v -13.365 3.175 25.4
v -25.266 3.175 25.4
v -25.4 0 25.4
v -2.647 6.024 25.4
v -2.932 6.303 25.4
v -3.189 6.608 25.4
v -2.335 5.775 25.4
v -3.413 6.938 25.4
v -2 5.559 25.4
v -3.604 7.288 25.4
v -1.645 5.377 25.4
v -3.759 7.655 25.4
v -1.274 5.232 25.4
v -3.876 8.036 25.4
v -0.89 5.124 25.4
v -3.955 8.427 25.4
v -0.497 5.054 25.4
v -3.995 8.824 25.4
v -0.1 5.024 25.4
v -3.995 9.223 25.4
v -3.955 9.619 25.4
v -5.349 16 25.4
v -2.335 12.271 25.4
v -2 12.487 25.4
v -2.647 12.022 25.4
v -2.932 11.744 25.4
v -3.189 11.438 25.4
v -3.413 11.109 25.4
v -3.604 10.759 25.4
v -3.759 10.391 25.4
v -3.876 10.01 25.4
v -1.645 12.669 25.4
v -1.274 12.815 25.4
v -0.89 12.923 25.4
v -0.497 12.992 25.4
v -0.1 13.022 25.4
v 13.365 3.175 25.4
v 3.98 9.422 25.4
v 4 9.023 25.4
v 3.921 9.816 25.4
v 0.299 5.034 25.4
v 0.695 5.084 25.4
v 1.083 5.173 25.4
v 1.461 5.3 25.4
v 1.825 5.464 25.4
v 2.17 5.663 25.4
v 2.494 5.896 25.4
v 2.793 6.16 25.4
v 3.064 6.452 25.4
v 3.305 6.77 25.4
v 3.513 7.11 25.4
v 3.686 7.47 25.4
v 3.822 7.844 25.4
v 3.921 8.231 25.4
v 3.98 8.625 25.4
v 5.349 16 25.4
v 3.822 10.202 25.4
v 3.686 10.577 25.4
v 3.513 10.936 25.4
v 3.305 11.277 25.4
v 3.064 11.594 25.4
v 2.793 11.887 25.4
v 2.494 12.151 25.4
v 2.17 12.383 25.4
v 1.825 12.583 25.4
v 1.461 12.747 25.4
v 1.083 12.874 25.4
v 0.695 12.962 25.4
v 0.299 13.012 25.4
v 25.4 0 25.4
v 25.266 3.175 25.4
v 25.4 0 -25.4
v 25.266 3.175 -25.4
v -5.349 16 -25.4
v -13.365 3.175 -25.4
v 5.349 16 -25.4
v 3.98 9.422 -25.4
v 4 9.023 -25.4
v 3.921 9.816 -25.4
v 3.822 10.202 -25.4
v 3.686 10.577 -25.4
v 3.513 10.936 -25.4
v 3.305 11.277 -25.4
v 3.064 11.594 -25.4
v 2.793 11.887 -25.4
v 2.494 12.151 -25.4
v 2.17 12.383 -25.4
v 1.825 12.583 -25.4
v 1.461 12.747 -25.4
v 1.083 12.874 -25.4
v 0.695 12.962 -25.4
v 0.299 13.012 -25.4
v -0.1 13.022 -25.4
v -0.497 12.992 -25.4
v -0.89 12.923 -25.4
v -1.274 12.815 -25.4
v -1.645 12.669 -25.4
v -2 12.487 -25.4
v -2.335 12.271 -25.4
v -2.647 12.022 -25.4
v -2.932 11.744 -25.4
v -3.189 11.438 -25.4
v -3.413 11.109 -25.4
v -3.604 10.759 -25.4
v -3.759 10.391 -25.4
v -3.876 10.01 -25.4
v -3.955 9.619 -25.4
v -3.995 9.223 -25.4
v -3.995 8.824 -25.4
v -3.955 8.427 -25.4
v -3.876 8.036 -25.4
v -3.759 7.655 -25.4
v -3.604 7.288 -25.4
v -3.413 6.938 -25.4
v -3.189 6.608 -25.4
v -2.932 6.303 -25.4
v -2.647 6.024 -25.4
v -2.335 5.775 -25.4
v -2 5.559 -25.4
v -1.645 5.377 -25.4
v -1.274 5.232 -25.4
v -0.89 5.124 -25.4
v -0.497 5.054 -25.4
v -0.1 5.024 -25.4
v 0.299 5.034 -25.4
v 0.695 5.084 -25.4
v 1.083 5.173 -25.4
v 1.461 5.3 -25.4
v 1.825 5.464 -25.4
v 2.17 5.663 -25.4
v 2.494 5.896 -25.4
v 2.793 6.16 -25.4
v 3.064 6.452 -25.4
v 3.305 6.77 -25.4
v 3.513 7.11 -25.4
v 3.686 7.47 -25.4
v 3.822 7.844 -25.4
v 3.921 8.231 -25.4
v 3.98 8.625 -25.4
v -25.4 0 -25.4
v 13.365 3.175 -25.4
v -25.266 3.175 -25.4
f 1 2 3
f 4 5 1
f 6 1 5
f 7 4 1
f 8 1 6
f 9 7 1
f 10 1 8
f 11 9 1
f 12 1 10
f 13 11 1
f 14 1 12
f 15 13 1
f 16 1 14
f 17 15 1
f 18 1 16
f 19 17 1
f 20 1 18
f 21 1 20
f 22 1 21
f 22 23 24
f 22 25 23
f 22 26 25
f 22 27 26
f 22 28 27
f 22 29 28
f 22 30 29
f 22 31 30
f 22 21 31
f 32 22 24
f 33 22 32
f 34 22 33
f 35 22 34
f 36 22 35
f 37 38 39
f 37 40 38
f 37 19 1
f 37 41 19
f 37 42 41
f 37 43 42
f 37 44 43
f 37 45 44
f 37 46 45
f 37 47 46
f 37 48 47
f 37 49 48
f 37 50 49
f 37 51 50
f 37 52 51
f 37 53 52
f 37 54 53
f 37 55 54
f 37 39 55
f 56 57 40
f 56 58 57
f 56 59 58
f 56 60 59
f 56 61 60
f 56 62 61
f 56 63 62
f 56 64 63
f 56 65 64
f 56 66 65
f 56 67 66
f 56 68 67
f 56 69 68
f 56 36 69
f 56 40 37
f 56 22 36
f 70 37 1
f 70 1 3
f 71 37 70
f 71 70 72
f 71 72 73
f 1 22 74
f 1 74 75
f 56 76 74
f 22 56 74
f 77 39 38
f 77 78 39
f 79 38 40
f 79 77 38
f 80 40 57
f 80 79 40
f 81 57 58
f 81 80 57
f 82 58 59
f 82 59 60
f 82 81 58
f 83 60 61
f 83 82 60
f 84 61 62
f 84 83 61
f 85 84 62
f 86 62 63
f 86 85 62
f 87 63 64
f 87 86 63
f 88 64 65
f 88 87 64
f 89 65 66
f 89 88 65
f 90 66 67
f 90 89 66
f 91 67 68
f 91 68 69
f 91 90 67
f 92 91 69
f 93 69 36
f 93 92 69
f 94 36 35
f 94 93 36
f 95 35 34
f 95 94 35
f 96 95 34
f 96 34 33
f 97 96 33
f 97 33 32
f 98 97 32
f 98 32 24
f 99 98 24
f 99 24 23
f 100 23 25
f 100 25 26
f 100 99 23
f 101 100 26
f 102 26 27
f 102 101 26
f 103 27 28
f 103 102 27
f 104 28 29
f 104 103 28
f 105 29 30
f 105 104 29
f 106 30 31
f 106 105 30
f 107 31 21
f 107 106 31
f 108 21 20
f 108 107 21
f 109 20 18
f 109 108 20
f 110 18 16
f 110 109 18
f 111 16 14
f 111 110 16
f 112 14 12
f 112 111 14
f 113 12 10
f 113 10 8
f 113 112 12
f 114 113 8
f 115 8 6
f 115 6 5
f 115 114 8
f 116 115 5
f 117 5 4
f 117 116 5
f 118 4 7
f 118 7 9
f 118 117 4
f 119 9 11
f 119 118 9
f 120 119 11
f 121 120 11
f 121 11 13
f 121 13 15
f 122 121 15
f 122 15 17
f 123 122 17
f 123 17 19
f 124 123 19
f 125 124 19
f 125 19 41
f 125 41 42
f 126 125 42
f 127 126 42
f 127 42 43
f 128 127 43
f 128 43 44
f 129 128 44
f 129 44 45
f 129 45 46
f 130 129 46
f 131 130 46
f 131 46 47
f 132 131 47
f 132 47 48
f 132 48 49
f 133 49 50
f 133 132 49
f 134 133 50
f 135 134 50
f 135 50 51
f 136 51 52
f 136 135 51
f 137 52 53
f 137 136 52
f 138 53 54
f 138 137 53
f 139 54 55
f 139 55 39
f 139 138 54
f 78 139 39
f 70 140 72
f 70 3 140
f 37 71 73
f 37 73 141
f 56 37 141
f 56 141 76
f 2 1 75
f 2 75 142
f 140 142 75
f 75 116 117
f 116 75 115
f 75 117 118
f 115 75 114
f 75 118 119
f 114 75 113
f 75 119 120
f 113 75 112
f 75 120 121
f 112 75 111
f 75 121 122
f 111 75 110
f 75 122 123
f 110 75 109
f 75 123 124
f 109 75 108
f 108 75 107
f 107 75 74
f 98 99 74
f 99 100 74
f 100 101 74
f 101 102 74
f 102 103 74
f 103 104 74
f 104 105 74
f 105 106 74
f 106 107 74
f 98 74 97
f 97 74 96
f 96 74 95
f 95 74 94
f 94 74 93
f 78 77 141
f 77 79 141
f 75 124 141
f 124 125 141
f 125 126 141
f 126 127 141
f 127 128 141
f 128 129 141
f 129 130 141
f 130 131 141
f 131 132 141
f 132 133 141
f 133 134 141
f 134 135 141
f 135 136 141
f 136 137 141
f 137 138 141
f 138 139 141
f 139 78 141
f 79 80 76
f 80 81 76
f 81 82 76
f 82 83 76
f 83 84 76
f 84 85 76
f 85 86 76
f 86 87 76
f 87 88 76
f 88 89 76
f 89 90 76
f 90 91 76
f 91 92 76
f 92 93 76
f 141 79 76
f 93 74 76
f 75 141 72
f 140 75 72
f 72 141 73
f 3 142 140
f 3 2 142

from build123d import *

# Parameters (mm, degrees)
F1_DEPTH = 25.4
F2_R     = 4
F3_DEPTH = 25.4


with BuildPart() as f1:
    # F0 (on Top) → F1 (new body, symmetric)
    with BuildSketch(Plane.XY):
        Polygon((-25.4, 0), (0, 0), (25.4, 0), (25.266184, 3.175), (0, 3.175), (-25.266184, 3.175), align=None)
    extrude(amount=F1_DEPTH, both=True)

    # F2 (on Top) → F3 (join, symmetric)
    with BuildSketch(Plane.XY):
        Polygon((-5.34885, 16), (-15.349967, 0), (15.349967, 0), (5.34885, 16), (0, 16), align=None)
        with Locations((0, 9.023245)):
            Circle(F2_R, mode=Mode.SUBTRACT)
    extrude(amount=F3_DEPTH, both=True)


solid = f1.part
